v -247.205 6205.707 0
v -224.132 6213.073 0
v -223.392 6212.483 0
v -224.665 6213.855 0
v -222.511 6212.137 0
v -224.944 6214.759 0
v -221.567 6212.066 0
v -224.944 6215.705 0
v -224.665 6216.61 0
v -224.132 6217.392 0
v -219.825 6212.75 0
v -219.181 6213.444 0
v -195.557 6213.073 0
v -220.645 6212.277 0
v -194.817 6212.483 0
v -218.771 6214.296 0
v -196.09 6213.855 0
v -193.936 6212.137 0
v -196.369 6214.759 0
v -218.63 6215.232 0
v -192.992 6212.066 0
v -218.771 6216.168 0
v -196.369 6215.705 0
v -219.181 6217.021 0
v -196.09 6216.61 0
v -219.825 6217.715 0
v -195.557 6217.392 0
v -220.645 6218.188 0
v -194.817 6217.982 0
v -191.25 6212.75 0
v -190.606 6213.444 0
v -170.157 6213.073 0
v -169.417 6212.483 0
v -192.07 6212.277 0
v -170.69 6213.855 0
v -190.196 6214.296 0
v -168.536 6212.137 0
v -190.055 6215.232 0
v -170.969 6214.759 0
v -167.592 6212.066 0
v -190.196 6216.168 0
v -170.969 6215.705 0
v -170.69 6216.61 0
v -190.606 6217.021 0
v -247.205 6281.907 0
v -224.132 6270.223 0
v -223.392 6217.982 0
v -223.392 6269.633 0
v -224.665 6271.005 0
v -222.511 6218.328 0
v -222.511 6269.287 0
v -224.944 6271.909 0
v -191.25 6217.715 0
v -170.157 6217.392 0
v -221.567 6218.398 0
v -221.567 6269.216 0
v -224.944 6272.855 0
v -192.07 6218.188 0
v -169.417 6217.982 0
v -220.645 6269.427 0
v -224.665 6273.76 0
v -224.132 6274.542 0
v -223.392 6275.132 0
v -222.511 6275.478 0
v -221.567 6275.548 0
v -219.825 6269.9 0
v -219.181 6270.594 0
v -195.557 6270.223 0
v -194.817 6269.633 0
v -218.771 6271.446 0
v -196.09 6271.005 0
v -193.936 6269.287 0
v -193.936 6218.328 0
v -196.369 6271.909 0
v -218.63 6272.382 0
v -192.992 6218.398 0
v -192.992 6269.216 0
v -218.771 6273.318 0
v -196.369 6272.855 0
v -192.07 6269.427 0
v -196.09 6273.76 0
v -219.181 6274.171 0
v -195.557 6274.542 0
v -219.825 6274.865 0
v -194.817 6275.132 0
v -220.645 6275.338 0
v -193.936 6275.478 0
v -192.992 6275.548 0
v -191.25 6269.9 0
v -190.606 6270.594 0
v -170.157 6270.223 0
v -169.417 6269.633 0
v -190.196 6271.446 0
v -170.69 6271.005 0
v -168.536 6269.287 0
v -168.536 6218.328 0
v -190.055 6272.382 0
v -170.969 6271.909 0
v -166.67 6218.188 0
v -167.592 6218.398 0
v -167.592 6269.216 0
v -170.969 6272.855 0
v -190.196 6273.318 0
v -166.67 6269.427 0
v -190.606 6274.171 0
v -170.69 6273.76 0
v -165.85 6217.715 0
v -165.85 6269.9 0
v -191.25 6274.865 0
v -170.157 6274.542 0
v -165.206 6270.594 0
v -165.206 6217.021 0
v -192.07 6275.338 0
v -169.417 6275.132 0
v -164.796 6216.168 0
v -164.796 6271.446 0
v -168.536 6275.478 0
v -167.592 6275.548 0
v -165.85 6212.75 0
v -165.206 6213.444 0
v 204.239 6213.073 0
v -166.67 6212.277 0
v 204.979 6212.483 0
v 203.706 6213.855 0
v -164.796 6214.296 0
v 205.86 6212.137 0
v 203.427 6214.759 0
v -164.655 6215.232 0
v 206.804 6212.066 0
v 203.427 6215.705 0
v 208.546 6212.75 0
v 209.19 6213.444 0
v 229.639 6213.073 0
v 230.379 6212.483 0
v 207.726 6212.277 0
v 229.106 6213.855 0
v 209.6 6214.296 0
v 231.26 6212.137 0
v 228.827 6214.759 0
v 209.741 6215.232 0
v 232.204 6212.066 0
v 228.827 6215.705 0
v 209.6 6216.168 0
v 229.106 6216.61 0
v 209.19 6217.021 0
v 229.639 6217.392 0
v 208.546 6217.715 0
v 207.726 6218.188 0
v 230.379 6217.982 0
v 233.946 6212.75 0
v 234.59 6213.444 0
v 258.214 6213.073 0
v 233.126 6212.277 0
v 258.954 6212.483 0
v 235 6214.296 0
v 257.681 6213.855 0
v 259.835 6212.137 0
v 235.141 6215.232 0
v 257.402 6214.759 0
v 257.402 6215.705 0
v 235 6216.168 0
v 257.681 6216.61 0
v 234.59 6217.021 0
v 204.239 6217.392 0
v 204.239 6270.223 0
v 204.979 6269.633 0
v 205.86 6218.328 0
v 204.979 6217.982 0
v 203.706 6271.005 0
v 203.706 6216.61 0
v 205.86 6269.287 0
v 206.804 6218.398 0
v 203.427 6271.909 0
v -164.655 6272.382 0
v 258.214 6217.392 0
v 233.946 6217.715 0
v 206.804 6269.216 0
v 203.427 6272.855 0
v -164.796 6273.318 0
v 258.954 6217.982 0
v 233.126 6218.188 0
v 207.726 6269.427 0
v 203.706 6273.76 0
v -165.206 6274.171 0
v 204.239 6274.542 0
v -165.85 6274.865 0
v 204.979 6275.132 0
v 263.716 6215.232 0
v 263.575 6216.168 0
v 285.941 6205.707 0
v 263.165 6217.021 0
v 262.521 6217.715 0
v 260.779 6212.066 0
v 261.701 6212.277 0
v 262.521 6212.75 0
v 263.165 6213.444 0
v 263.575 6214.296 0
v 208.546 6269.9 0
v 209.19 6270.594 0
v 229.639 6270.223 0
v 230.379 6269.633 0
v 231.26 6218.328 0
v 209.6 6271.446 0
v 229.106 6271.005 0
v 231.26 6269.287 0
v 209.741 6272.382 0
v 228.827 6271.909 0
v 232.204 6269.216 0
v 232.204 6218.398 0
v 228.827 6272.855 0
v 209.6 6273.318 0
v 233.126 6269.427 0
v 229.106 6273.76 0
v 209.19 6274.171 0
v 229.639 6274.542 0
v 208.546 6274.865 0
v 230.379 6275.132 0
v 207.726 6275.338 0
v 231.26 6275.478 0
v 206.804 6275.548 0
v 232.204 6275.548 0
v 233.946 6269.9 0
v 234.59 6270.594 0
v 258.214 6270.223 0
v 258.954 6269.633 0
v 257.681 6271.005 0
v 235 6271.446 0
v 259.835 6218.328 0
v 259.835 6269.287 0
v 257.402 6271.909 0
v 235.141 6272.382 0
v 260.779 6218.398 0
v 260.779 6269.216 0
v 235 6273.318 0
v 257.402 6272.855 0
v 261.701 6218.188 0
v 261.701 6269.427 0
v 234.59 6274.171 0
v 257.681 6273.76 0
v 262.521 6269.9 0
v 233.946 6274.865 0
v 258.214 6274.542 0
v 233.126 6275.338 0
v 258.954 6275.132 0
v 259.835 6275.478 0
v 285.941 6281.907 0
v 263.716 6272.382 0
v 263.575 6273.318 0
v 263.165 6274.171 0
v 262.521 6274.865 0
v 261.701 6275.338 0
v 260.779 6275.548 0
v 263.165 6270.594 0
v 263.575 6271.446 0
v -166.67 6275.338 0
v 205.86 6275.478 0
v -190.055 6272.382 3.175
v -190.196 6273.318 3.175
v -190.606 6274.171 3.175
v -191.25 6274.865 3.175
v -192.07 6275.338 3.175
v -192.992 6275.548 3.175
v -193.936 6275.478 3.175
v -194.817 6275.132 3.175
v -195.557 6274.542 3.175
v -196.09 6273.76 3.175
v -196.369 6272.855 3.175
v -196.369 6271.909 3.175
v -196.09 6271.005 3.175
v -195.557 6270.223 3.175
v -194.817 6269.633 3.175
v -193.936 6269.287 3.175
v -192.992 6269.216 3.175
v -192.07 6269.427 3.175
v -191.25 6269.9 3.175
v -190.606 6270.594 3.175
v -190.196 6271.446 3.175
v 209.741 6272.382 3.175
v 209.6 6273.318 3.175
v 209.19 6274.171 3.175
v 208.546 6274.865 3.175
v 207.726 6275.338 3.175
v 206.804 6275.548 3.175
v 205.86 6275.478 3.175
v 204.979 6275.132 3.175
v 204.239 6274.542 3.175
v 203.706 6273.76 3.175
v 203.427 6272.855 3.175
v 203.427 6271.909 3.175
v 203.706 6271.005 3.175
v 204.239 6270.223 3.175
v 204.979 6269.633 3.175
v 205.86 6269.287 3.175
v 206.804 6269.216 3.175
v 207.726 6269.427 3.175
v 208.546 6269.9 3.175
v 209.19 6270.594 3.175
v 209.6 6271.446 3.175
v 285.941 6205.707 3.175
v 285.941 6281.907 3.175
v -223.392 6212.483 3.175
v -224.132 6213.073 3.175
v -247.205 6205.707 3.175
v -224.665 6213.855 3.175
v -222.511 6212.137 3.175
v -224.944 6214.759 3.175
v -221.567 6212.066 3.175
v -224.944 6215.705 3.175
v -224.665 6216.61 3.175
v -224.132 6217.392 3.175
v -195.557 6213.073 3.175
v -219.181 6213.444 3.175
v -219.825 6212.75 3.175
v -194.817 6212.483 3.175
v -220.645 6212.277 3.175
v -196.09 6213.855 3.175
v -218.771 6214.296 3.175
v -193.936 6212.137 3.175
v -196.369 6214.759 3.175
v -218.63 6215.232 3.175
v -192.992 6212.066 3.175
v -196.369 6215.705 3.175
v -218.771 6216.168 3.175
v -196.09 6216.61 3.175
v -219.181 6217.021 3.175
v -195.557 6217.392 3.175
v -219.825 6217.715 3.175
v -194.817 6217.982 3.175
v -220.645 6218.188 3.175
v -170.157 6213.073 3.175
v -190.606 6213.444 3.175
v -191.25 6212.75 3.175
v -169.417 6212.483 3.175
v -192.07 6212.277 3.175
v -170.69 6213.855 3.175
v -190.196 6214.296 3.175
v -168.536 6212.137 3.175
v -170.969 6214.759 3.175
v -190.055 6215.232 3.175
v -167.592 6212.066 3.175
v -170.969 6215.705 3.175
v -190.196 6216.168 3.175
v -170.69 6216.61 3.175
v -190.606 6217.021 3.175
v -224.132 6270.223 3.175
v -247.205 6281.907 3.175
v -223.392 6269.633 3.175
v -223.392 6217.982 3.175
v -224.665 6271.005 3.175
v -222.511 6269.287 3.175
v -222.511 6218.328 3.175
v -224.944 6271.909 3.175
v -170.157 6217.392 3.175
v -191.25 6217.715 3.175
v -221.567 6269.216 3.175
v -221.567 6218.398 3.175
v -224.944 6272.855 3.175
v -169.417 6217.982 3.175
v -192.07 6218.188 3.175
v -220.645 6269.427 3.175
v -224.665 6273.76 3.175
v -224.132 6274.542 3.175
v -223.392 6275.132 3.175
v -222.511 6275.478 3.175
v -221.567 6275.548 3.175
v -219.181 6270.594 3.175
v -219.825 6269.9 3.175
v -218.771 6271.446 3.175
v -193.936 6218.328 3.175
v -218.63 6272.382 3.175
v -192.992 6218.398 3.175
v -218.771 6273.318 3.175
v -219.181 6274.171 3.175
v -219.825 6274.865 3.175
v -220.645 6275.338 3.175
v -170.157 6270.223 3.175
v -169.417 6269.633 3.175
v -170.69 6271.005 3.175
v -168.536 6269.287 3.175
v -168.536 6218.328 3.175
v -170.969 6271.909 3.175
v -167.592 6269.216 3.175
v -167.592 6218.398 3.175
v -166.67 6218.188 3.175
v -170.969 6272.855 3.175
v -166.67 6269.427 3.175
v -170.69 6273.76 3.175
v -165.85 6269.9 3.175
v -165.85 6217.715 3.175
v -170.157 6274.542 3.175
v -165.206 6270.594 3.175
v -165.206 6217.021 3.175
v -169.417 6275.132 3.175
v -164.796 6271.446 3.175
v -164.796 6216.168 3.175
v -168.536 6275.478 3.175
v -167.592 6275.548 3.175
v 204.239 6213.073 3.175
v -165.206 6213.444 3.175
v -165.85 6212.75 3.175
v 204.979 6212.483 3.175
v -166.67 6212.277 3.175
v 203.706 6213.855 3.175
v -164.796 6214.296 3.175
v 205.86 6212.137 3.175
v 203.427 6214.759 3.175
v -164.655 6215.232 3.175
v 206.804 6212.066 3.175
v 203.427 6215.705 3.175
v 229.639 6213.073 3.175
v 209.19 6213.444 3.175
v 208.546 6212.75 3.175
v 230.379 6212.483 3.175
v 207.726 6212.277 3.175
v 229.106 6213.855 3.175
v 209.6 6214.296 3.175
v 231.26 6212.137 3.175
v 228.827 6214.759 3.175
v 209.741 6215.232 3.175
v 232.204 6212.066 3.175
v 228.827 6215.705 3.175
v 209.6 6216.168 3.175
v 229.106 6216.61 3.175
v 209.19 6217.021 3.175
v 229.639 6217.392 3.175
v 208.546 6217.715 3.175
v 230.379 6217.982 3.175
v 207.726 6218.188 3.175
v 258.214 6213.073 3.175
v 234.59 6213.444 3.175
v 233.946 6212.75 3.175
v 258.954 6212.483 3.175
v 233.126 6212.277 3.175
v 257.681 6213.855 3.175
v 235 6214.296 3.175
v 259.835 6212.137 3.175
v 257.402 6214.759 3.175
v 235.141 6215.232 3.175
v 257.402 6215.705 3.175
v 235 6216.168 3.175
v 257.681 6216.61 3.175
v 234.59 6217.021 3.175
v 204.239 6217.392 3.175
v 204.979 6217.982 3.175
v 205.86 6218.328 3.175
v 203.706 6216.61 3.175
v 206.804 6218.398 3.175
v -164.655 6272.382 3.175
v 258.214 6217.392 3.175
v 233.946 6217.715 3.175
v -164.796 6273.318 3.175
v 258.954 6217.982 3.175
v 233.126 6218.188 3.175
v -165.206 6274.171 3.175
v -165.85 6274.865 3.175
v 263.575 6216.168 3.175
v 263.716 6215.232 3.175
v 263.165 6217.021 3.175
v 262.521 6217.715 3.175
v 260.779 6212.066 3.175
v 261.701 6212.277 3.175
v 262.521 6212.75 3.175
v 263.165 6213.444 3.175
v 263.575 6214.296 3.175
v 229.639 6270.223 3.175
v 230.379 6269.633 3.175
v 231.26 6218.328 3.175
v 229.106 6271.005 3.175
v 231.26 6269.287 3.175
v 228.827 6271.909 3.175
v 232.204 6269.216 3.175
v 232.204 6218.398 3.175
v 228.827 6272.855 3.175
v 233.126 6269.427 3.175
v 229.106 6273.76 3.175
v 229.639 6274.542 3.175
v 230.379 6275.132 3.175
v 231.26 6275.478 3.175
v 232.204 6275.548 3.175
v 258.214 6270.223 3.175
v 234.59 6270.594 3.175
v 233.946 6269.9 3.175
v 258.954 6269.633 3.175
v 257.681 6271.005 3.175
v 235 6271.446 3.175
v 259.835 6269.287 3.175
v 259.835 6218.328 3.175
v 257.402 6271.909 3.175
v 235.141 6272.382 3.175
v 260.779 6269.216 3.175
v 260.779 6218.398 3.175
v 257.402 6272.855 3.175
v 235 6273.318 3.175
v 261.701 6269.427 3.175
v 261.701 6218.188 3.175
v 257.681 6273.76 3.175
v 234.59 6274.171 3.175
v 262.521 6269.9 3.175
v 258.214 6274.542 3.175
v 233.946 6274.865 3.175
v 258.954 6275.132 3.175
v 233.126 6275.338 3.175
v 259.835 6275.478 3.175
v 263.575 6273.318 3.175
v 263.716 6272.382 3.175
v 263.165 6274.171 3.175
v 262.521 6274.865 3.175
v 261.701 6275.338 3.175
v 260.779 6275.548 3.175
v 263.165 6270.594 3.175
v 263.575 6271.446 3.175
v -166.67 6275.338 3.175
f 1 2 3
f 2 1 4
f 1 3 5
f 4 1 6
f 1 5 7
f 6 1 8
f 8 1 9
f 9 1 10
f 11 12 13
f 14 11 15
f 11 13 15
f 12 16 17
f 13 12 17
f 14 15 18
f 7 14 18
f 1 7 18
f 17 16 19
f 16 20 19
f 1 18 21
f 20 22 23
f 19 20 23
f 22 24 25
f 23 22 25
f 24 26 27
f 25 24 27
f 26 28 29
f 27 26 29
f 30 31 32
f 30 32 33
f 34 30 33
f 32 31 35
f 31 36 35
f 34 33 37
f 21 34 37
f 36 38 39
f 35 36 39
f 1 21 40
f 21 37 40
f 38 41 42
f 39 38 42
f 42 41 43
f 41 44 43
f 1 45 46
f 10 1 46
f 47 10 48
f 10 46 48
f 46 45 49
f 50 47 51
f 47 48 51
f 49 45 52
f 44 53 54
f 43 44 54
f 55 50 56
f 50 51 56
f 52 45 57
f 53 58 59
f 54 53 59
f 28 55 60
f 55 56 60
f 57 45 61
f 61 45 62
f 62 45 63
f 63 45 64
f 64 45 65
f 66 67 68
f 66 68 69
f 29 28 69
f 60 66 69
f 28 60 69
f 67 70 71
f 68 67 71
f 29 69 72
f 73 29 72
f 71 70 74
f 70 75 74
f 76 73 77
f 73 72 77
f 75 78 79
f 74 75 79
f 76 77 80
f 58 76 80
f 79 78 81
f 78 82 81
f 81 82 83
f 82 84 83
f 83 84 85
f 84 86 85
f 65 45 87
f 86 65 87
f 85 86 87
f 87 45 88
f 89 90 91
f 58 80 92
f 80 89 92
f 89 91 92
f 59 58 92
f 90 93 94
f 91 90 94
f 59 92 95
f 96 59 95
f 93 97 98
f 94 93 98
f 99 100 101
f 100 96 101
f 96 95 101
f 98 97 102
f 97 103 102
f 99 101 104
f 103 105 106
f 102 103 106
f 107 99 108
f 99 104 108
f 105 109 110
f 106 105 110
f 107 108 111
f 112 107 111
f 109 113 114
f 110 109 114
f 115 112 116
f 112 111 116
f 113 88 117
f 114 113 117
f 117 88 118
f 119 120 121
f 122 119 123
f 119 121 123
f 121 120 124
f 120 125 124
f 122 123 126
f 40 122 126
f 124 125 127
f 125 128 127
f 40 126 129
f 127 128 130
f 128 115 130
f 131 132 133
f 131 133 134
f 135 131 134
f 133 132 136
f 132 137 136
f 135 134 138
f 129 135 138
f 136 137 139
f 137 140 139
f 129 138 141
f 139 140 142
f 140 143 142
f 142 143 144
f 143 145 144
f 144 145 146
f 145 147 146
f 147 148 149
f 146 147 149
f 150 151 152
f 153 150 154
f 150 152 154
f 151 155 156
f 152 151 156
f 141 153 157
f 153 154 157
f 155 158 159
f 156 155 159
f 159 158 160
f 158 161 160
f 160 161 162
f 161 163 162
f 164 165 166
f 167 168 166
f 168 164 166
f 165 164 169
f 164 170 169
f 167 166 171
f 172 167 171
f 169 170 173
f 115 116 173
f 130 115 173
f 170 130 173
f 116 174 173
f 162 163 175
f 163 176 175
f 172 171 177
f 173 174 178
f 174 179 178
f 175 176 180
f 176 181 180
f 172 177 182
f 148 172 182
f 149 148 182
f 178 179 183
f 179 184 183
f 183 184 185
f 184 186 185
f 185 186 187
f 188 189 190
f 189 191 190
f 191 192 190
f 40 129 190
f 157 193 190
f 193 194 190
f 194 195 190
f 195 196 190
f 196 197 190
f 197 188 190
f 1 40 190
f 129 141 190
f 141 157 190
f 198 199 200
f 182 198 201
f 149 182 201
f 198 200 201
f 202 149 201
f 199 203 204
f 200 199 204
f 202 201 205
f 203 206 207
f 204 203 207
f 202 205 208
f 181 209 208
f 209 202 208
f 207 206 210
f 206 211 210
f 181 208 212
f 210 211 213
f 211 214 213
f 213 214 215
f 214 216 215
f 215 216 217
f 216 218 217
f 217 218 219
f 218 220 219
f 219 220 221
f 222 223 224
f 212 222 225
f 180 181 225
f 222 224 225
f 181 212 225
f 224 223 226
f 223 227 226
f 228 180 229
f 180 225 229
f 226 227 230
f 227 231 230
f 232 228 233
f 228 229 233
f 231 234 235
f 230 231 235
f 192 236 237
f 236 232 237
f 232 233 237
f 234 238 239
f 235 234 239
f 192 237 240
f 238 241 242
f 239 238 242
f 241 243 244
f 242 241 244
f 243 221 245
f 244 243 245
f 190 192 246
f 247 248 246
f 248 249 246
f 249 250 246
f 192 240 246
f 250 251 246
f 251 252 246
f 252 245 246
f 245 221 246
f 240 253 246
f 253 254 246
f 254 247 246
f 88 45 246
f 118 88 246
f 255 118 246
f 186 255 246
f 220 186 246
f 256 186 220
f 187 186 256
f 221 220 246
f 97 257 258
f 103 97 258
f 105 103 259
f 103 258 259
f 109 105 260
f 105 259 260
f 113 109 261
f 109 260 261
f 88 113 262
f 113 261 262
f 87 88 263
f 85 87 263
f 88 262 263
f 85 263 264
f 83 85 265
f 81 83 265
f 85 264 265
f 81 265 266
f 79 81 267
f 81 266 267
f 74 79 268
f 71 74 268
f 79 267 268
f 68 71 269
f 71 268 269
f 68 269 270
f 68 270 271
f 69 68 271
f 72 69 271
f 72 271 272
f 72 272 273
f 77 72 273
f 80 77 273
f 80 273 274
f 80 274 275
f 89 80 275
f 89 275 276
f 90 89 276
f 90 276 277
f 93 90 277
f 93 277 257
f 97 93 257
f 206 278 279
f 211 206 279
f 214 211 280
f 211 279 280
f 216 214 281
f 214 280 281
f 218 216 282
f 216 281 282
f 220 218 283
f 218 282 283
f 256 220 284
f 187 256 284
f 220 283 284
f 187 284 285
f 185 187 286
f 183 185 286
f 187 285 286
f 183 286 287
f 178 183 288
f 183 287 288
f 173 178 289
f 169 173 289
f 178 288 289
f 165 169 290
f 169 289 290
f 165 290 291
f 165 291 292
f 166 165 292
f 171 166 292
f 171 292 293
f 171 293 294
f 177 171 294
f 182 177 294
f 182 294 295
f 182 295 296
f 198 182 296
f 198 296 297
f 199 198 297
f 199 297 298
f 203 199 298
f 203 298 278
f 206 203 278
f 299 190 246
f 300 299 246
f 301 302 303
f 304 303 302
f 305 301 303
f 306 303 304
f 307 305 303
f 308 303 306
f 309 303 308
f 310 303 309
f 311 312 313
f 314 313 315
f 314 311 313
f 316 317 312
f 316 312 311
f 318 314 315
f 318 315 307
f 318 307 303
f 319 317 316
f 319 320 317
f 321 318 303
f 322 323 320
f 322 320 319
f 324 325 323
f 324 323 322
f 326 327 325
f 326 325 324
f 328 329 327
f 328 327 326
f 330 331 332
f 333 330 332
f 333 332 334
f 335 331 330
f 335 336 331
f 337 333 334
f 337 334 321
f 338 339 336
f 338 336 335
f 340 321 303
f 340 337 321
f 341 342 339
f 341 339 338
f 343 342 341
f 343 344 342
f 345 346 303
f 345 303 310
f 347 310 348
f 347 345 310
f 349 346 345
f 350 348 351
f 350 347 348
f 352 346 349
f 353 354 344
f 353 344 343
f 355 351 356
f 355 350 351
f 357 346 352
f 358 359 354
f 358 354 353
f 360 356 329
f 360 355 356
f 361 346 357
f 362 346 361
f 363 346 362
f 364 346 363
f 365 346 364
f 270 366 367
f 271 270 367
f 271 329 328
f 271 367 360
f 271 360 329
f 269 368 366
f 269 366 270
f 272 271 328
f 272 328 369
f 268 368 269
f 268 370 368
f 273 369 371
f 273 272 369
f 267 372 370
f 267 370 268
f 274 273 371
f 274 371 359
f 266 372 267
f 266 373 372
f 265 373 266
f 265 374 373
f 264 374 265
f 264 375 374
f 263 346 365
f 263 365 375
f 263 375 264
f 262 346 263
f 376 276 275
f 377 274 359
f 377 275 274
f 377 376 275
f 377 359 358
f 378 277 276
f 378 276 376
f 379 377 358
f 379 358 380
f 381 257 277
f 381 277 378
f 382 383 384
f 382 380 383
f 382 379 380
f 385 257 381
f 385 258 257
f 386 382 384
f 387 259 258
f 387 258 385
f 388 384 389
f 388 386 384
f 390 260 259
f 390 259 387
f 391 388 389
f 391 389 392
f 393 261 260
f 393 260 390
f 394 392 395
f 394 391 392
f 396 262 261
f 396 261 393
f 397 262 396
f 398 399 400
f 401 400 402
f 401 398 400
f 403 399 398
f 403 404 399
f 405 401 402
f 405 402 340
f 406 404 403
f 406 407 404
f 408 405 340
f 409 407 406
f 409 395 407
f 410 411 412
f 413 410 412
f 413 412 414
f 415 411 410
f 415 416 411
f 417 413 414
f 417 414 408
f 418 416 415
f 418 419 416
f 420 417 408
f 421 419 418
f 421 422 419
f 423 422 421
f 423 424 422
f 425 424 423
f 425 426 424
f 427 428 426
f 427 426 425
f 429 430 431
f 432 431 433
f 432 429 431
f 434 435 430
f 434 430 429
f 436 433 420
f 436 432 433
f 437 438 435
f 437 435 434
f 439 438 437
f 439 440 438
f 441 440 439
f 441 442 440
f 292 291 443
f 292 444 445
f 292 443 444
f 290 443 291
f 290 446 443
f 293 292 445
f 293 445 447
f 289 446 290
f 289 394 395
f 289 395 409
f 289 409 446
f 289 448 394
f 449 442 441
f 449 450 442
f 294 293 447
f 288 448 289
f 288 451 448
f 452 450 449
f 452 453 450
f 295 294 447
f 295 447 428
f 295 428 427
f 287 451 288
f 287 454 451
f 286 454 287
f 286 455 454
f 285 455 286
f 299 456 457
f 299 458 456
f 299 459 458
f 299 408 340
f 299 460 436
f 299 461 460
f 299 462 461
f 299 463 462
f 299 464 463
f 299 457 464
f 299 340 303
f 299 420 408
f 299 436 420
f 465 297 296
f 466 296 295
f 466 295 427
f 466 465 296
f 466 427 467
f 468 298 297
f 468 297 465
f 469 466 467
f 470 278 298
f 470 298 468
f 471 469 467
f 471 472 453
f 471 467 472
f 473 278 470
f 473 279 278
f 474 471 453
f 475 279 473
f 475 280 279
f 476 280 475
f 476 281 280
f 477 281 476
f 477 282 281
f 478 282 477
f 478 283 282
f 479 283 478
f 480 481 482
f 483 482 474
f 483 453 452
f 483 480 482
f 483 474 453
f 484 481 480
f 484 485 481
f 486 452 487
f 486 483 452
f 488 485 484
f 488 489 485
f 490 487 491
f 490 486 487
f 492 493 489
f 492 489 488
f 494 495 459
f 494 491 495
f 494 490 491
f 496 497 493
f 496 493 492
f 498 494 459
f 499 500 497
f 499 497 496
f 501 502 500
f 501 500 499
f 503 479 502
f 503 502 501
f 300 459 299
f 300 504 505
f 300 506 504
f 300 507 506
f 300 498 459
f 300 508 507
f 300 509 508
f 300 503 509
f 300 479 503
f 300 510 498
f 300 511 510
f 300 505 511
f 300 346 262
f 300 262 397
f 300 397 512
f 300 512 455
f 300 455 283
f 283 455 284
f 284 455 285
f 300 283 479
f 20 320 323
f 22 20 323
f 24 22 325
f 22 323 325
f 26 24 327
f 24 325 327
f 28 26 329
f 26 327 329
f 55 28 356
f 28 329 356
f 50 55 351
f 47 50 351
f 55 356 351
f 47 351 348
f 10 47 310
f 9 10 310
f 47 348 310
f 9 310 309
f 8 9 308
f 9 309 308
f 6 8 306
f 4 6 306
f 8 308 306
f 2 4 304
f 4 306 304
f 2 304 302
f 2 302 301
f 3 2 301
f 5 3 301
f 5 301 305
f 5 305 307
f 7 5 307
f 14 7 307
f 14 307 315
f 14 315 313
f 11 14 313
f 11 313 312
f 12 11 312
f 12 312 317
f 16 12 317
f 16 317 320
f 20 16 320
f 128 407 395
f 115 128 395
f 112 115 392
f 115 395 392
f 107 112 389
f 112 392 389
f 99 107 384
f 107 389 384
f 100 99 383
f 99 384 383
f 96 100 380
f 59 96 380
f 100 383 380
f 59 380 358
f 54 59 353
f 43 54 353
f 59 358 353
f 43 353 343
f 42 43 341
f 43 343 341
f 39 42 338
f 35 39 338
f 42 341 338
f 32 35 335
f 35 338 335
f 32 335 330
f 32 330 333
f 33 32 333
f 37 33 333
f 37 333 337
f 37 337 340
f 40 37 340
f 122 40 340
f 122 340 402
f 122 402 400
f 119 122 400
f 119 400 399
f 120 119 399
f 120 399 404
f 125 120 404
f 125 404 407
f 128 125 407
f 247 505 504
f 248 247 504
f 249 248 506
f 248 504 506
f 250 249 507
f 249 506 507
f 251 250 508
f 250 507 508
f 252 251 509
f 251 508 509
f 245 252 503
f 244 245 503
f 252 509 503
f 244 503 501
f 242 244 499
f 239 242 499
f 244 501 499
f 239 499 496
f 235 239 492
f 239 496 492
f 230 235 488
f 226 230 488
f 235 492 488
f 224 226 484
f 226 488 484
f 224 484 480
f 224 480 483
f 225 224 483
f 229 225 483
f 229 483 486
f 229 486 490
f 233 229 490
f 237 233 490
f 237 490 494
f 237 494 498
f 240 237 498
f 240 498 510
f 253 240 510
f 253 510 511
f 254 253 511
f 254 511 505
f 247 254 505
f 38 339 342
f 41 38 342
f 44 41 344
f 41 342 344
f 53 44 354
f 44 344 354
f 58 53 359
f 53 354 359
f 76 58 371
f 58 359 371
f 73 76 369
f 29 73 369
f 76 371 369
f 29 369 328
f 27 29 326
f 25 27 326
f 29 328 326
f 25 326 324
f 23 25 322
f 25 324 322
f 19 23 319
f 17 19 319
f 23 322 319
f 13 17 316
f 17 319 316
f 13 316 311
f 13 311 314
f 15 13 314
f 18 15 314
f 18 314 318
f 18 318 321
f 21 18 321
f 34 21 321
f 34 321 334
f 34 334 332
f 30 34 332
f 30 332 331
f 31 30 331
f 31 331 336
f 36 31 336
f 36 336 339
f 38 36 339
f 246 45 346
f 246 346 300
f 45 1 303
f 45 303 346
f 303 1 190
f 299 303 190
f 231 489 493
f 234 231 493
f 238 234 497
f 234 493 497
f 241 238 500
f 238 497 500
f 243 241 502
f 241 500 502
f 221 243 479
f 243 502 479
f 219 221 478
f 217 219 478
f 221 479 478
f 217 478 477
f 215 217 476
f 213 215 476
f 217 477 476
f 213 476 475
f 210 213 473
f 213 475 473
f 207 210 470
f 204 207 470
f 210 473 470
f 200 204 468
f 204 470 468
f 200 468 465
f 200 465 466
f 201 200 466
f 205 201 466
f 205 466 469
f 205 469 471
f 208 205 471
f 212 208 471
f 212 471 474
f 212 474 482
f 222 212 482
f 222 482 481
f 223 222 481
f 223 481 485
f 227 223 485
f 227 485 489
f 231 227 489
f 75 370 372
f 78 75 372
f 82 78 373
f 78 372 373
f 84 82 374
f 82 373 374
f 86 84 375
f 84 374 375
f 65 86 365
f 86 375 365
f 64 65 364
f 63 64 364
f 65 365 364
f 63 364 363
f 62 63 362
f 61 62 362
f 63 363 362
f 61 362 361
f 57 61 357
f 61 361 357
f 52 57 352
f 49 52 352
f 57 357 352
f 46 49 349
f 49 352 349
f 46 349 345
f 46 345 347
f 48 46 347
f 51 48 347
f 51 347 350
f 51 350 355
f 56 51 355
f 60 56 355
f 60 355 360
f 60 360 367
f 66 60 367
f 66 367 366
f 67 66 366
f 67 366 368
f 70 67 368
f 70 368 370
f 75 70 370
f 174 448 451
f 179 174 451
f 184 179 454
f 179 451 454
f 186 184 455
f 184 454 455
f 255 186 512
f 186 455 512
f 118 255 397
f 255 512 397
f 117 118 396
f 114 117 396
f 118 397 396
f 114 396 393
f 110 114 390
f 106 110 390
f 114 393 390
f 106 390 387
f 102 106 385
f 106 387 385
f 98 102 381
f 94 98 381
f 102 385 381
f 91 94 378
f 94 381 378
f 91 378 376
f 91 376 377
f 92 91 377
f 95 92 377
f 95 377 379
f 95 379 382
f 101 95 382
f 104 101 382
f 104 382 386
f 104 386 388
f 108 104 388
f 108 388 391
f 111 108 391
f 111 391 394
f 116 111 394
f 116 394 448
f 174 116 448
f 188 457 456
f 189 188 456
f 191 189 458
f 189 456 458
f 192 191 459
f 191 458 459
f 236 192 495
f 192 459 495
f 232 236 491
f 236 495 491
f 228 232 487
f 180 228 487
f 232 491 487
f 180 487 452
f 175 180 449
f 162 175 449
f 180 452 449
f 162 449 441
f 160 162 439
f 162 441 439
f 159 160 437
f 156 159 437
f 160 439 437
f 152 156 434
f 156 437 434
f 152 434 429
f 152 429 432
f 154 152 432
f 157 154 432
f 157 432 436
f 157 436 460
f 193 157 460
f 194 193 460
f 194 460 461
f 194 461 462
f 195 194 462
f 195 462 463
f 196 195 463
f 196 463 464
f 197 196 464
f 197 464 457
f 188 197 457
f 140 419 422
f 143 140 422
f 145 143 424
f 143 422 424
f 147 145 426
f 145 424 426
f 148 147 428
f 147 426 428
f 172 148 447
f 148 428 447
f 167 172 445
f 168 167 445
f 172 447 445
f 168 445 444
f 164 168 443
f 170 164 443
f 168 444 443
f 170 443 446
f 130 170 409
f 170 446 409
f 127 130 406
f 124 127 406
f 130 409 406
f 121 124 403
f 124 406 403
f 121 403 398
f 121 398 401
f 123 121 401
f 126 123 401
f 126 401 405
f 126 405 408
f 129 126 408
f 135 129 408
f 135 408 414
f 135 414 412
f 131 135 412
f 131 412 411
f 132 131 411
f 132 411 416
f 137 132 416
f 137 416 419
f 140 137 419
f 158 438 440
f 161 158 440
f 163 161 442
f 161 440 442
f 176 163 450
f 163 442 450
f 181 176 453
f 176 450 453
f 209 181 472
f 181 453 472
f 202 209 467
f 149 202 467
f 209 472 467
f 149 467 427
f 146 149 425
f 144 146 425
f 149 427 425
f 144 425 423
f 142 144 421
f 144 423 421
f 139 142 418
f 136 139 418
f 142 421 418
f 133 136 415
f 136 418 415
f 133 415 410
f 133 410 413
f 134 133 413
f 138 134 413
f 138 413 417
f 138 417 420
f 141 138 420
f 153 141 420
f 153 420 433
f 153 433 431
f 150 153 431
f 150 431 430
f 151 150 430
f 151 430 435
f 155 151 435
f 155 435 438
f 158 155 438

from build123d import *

# Parameters (mm, degrees)
SKETCH1_W                   = 533.146
SKETCH1_H                   = 76.2
BOSS_EXTRUDE1_DEPTH         = 3.175
F_1_4_0_25_DIAMETER_HOLE1_D = 6.35


with BuildPart() as part:
    # Sketch1 → Boss-Extrude1 (new body)
    with BuildSketch(Plane(origin=(0, -330.2, 0), x_dir=(1, 0, 0), z_dir=(0, 0, 1))):
        with Locations((19.368396109, 6574.00722403)):
            Rectangle(SKETCH1_W, SKETCH1_H)
    extrude(amount=BOSS_EXTRUDE1_DEPTH)

    # 1/4 (0.25) Diameter Hole1 (through all)
    with Locations(Plane(origin=(0, 0, 0), x_dir=(-1, 0, 0), z_dir=(0, 0, -1))):
        with Locations((-231.966396109, 6215.23222403), (-206.566396109, 6215.23222403), (-206.566396109, 6272.38222403), (-231.966396109, 6272.38222403), (-260.541396109, 6215.23222403), (-260.541396109, 6272.38222403), (221.804603891, 6272.38222403), (221.804603891, 6215.23222403), (193.229603891, 6272.38222403), (167.829603891, 6272.38222403), (167.829603891, 6215.23222403), (193.229603891, 6215.23222403)):
            Hole(F_1_4_0_25_DIAMETER_HOLE1_D / 2)


solid = part.part
